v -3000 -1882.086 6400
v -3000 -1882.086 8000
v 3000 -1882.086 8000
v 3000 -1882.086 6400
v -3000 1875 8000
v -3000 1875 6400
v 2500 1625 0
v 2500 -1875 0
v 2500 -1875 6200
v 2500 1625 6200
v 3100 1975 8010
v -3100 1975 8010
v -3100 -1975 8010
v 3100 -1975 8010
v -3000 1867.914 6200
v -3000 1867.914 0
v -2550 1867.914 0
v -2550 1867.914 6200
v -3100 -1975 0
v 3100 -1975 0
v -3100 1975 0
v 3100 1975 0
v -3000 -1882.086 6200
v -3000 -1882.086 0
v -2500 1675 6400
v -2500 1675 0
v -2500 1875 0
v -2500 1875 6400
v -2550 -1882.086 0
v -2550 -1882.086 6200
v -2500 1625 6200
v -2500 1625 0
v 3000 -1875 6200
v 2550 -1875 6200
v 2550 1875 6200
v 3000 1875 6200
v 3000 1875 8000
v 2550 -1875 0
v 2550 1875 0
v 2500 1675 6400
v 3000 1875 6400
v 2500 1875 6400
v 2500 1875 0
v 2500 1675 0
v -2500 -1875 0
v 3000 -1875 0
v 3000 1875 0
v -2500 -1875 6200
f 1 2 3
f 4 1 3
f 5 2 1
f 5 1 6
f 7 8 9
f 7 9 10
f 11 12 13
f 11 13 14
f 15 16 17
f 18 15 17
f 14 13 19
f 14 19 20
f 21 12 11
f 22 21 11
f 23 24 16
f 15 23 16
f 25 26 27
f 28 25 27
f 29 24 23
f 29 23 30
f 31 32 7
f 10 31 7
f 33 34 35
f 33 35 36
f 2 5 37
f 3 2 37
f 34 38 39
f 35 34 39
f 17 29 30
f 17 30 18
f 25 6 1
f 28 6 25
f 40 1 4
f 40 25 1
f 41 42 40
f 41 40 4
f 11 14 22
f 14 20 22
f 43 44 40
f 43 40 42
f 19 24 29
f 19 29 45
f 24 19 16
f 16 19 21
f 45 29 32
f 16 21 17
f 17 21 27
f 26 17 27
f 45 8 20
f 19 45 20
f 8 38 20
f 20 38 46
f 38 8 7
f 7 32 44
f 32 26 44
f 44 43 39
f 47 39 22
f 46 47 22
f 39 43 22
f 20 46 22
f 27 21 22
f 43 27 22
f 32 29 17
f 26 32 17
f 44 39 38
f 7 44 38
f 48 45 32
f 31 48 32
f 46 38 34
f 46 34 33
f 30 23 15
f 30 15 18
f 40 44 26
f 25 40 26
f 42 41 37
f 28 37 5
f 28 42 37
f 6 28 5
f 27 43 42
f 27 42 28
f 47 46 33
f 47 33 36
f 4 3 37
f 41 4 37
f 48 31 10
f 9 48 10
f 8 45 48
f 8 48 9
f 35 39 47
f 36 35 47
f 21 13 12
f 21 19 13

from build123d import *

# Parameters (mm, degrees)
SKETCH1_W           = 6200
SKETCH1_H           = 3950
BOSS_EXTRUDE1_DEPTH = 8000
SKETCH2_W           = 5000
SKETCH2_H           = 3500
CUT_EXTRUDE3_DEPTH  = 6200
SKETCH4_W           = 450
SKETCH4_H           = 3750
CUT_EXTRUDE5_DEPTH  = 6200
SKETCH5_W           = 5000
SKETCH5_H           = 200
CUT_EXTRUDE6_DEPTH  = 8000
SKETCH6_W           = 6000
SKETCH6_H           = 3757.085511021
CUT_EXTRUDE8_DEPTH  = 1600
SKETCH7_W           = 6200
SKETCH7_H           = 3950
BOSS_EXTRUDE2_DEPTH = 10


with BuildPart() as part:
    # Sketch1 → Boss-Extrude1 (new body)
    with BuildSketch(Plane.XY):
        Rectangle(SKETCH1_W, SKETCH1_H)
    extrude(amount=BOSS_EXTRUDE1_DEPTH)

    # Sketch2 → Cut-Extrude3 (cut)
    with BuildSketch(Plane.XY):
        with Locations((0, -125)):
            Rectangle(SKETCH2_W, SKETCH2_H)
    extrude(amount=CUT_EXTRUDE3_DEPTH, mode=Mode.SUBTRACT)

    # Sketch4 → Cut-Extrude5 (cut)
    with BuildSketch(Plane.XY):
        with Locations((2775, 0)):
            Rectangle(SKETCH4_W, SKETCH4_H)
        with Locations((-2775, -7.085511021)):
            Rectangle(SKETCH4_W, SKETCH4_H)
    extrude(amount=CUT_EXTRUDE5_DEPTH, mode=Mode.SUBTRACT)

    # Sketch5 → Cut-Extrude6 (cut)
    with BuildSketch(Plane(origin=(0, 0, 0), x_dir=(-1, 0, 0), z_dir=(0, 0, -1))):
        with Locations((0, 1775)):
            Rectangle(SKETCH5_W, SKETCH5_H)
    extrude(amount=-CUT_EXTRUDE6_DEPTH, mode=Mode.SUBTRACT)

    # Sketch6 → Cut-Extrude8 (cut)
    with BuildSketch(Plane.XY.offset(8000)):
        with Locations((0, -3.542755511)):
            Rectangle(SKETCH6_W, SKETCH6_H)
    extrude(amount=-CUT_EXTRUDE8_DEPTH, mode=Mode.SUBTRACT)

    # Sketch7 → Boss-Extrude2 (add)
    with BuildSketch(Plane.XY.offset(8000)):
        Rectangle(SKETCH7_W, SKETCH7_H)
    extrude(amount=BOSS_EXTRUDE2_DEPTH)


solid = part.part
